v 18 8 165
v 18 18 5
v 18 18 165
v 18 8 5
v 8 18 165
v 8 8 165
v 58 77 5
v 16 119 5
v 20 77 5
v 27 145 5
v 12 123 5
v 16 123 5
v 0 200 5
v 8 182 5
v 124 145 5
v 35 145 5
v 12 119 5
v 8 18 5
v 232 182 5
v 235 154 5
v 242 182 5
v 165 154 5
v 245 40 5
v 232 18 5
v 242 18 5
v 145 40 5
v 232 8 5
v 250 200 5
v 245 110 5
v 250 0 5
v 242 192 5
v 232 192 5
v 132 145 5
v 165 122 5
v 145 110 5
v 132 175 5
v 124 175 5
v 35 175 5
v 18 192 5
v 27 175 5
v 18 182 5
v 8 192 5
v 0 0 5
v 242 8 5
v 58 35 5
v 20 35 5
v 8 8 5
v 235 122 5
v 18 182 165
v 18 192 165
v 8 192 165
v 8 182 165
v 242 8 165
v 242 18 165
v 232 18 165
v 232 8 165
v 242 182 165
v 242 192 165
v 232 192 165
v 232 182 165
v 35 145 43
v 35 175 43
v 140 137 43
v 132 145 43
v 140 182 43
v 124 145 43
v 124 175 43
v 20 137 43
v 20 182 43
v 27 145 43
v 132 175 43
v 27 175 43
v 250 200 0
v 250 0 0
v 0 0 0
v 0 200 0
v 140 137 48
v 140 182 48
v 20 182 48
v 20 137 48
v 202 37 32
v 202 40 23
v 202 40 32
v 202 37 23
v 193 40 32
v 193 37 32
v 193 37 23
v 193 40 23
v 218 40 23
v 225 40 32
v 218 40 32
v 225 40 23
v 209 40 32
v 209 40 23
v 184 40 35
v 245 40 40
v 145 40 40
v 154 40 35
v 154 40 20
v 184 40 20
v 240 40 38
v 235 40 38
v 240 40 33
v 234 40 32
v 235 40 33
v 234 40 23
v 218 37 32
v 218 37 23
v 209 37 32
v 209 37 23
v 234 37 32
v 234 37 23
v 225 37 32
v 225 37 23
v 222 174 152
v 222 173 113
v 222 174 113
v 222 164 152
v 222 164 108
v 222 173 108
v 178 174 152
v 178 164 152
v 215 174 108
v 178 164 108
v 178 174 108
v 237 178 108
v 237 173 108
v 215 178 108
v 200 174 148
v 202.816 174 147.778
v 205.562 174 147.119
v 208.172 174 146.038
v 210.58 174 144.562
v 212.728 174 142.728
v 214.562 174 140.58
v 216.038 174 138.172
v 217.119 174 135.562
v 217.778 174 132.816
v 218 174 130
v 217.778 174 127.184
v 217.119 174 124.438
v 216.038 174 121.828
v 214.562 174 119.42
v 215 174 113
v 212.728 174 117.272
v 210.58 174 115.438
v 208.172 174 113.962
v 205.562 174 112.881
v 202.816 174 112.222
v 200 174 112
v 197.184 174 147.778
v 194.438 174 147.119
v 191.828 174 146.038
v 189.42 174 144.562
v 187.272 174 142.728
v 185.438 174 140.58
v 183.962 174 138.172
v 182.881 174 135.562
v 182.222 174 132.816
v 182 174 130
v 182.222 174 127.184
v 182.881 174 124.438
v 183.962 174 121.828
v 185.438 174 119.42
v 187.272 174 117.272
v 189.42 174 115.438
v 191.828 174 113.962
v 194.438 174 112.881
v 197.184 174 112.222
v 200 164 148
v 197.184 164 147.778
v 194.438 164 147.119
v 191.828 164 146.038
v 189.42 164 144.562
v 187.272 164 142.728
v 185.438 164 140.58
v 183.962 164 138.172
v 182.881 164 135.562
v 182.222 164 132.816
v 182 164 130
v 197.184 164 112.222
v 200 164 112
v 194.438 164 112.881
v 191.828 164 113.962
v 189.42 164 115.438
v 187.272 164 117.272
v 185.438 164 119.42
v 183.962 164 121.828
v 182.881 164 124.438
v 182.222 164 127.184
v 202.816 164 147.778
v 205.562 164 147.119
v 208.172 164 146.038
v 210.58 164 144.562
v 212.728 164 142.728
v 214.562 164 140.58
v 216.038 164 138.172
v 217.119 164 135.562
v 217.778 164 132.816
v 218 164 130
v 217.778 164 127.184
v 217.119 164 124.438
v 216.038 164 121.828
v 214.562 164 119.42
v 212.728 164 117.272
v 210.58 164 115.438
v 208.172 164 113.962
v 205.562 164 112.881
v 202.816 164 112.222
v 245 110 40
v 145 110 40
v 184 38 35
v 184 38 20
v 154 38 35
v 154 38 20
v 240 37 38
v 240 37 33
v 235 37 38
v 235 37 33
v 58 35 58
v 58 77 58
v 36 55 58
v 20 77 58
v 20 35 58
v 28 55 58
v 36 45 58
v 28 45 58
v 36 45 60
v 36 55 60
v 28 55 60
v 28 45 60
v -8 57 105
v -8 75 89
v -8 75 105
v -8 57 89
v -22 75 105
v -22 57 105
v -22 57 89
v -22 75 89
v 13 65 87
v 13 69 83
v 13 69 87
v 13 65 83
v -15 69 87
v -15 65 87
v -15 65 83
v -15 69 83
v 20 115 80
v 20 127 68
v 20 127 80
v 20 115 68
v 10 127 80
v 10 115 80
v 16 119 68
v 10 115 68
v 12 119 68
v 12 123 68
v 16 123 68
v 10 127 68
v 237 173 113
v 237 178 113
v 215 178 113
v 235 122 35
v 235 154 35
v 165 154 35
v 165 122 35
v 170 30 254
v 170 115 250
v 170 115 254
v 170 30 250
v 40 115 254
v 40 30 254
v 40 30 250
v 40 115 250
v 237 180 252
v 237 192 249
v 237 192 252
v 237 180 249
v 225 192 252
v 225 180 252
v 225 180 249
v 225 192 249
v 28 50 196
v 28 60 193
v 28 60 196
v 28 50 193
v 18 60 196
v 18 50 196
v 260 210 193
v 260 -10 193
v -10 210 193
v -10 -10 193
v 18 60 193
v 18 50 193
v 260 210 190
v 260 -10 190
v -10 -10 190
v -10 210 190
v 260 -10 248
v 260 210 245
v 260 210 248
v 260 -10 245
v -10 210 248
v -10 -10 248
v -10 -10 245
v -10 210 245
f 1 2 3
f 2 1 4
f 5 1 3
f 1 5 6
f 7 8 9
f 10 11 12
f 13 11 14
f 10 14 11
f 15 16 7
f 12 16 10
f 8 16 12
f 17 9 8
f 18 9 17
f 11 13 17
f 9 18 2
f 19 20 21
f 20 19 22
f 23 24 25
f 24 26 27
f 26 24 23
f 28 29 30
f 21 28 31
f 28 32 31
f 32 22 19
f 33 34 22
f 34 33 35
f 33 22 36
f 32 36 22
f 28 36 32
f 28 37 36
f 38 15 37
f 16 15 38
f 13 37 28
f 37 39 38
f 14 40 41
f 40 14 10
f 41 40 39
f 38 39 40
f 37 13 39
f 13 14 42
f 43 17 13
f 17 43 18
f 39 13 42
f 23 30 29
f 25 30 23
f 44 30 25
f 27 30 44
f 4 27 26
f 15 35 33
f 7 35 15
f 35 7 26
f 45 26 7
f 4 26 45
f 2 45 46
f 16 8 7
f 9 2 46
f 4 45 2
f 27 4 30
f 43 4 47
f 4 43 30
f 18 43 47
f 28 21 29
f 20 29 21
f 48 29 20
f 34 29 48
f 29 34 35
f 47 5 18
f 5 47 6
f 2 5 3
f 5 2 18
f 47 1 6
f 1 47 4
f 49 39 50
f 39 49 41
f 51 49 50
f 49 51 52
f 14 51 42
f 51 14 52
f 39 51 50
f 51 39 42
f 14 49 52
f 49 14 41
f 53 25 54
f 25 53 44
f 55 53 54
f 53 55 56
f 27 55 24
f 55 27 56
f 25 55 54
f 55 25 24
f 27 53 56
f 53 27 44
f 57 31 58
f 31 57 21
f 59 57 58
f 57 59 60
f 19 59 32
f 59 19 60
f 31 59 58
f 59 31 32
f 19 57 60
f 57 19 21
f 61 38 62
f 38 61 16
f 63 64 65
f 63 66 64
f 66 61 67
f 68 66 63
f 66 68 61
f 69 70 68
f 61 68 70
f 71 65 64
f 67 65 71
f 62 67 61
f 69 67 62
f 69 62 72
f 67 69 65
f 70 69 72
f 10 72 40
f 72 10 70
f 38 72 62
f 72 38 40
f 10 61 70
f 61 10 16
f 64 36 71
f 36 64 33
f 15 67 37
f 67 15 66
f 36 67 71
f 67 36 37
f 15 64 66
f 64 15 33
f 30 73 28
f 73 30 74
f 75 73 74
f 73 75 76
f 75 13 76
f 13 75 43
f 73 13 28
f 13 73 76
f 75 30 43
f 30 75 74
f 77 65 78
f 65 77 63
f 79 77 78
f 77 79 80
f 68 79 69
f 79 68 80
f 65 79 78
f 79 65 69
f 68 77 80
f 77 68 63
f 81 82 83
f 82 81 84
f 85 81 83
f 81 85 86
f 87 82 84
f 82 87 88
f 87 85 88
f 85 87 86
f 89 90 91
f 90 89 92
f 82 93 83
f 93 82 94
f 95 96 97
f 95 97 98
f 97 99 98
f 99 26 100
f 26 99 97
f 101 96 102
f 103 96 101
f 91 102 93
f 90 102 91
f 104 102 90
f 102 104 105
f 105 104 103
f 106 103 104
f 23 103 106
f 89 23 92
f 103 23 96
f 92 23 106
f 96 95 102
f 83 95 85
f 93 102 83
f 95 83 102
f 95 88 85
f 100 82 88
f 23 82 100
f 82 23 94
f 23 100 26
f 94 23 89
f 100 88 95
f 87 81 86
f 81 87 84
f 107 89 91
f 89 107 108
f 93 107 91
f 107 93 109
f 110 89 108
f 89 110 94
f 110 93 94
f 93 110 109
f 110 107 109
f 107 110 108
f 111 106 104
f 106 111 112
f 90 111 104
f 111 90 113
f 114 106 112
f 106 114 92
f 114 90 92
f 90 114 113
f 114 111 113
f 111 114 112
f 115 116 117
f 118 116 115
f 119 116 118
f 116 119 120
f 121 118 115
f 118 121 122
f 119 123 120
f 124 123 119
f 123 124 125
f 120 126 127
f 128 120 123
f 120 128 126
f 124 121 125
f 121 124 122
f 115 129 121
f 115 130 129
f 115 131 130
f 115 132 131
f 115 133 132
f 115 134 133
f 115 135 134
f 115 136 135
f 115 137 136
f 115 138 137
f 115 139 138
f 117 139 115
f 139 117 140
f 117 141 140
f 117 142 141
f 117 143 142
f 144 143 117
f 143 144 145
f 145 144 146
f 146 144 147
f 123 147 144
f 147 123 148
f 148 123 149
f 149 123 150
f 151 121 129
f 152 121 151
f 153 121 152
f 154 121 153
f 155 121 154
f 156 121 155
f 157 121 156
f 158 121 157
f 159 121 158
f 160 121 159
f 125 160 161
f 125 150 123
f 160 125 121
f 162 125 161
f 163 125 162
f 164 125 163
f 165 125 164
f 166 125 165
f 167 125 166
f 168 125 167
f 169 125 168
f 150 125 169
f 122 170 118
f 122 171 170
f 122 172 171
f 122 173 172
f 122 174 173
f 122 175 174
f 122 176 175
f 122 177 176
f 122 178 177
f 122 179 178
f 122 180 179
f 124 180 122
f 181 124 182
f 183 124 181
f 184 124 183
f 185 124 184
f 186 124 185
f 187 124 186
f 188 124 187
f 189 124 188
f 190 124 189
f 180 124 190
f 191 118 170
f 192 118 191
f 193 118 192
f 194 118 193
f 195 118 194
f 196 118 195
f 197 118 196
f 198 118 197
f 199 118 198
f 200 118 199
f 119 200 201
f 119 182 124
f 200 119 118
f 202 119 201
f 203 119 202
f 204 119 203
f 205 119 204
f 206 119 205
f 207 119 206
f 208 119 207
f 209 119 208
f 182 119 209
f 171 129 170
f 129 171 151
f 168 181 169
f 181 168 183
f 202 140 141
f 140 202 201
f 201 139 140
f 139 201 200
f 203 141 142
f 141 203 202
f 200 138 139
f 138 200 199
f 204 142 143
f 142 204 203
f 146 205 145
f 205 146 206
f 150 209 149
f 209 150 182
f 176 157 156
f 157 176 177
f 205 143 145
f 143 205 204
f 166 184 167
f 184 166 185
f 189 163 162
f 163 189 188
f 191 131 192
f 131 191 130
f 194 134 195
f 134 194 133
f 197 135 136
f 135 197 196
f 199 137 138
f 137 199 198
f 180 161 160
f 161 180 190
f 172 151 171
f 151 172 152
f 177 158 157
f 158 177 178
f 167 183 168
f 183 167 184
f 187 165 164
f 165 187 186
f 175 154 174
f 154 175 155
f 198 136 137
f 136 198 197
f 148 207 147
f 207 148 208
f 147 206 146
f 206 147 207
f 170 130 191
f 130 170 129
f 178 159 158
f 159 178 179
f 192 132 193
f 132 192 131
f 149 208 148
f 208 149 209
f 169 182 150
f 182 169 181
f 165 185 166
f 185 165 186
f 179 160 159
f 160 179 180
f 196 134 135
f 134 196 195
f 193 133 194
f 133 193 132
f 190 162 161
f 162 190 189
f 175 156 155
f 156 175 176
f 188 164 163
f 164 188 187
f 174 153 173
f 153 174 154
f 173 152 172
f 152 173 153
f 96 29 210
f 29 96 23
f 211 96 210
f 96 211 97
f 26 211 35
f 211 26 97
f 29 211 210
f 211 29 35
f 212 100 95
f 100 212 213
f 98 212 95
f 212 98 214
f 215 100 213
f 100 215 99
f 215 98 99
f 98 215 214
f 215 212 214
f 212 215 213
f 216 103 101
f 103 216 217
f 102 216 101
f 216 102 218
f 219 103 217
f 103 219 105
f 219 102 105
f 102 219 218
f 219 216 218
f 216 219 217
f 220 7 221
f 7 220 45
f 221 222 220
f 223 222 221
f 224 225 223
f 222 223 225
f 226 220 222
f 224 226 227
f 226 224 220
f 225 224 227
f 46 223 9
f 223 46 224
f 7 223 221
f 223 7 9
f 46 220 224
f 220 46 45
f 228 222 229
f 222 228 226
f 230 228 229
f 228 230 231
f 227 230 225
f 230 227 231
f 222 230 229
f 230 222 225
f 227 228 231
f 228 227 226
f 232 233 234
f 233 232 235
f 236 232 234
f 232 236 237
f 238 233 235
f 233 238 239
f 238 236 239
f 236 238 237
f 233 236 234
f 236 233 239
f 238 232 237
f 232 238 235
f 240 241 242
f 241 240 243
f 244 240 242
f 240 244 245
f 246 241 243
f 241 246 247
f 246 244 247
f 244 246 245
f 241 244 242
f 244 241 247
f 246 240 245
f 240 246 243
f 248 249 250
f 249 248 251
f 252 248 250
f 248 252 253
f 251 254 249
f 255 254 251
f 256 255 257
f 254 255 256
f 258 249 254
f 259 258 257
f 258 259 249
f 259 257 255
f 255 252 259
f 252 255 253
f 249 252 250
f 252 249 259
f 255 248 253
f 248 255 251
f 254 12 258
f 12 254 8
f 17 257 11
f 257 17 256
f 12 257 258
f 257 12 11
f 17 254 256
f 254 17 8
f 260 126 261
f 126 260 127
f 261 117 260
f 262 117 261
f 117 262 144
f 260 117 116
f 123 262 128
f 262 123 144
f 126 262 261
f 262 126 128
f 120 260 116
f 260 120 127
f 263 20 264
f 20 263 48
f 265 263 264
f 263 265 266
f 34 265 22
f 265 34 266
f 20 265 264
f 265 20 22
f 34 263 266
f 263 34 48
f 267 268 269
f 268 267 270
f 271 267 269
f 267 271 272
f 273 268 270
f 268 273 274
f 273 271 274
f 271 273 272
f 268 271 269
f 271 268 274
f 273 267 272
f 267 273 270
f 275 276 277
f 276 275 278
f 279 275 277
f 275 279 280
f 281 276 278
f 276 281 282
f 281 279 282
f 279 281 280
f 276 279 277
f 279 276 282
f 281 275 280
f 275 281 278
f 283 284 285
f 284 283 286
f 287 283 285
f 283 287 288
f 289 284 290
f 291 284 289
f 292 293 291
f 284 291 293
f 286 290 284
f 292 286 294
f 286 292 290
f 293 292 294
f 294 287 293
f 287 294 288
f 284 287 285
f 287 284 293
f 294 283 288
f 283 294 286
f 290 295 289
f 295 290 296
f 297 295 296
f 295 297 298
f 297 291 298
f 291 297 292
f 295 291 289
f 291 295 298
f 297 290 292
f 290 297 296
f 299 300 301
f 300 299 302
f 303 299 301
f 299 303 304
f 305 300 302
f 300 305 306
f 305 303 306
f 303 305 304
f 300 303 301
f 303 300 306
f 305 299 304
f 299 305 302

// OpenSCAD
// SAAYA VERIFY - editable miniature concept, millimetres.
// Open with OpenSCAD. F5 preview; F6 render. Set part_to_export for STL.
// Not a fabrication-validated assembly. External components are envelopes.
part_to_export = "assembly"; // assembly, structure, upper_roof, lower_roof
exploded = true;
show_optional = true;
base_x=250; base_y=200; base_t=5;
pillar_h=160; pillar_t=10;
roof_x=270; roof_y=220; roof_t=3; roof_gap=12;
roof_z=base_t+pillar_h;
module block(p,s,c) { color(c) translate(p) cube(s); }
module structure(){
 block([0,0,0],[base_x,base_y,base_t],"silver");
 for(x=[8,base_x-18],y=[8,base_y-18]) block([x,y,base_t],[pillar_t,pillar_t,pillar_h],"teal");
 block([20,137,43],[120,45,5],"tan");
 for(x=[27,124]) block([x,145,5],[8,30,38],"sienna");
}
module roof(){cube([roof_x,roof_y,roof_t]);}
module components(){
 block([145,40,5],[100,70,35],"darkslategray");
 block([154,38,20],[30,2,15],"lightgreen");
 for(x=[193,209,225]) block([x,37,23],[9,3,9],x==209?"tomato":"gold");
 block([235,37,33],[5,3,5],"orange");
 block([20,35,5],[38,42,53],"skyblue");
 block([28,45,50],[8,10,10],"gold");
 block([-22,57,89],[14,18,16],"gold");
 block([-15,65,83],[28,4,4],"teal");
 block([10,115,68],[10,12,12],"gold");
 block([12,119,5],[4,4,63],"teal");
 // Fan envelope, with intake opening. Grille detail conceptual only.
 color("slategray") translate([178,164,108]) difference(){cube([44,10,44]);translate([22,-1,22]) rotate([-90,0,0]) cylinder(h=12,r=18,$fn=40);}
 block([215,173,108],[22,5,5],"teal");
 if(show_optional) block([165,122,5],[70,32,30],"tan");
}
if(part_to_export=="upper_roof" || part_to_export=="lower_roof") roof();
else if(part_to_export=="structure") structure();
else {
 structure();components();
 color("lightgray") translate([-10,-10,roof_z+(exploded?25:0)]) roof();
 color("white") translate([-10,-10,roof_z+roof_t+roof_gap+(exploded?65:0)]) roof();
 if(show_optional){
 block([40,30,roof_z+roof_t+roof_gap+5+(exploded?65:0)],[130,85,4],"steelblue");
 block([225,180,roof_z+roof_t+roof_gap+4+(exploded?65:0)],[12,12,3],"gold");
 block([18,50,roof_z+3+(exploded?25:0)],[10,10,3],"gold");
 }
}
